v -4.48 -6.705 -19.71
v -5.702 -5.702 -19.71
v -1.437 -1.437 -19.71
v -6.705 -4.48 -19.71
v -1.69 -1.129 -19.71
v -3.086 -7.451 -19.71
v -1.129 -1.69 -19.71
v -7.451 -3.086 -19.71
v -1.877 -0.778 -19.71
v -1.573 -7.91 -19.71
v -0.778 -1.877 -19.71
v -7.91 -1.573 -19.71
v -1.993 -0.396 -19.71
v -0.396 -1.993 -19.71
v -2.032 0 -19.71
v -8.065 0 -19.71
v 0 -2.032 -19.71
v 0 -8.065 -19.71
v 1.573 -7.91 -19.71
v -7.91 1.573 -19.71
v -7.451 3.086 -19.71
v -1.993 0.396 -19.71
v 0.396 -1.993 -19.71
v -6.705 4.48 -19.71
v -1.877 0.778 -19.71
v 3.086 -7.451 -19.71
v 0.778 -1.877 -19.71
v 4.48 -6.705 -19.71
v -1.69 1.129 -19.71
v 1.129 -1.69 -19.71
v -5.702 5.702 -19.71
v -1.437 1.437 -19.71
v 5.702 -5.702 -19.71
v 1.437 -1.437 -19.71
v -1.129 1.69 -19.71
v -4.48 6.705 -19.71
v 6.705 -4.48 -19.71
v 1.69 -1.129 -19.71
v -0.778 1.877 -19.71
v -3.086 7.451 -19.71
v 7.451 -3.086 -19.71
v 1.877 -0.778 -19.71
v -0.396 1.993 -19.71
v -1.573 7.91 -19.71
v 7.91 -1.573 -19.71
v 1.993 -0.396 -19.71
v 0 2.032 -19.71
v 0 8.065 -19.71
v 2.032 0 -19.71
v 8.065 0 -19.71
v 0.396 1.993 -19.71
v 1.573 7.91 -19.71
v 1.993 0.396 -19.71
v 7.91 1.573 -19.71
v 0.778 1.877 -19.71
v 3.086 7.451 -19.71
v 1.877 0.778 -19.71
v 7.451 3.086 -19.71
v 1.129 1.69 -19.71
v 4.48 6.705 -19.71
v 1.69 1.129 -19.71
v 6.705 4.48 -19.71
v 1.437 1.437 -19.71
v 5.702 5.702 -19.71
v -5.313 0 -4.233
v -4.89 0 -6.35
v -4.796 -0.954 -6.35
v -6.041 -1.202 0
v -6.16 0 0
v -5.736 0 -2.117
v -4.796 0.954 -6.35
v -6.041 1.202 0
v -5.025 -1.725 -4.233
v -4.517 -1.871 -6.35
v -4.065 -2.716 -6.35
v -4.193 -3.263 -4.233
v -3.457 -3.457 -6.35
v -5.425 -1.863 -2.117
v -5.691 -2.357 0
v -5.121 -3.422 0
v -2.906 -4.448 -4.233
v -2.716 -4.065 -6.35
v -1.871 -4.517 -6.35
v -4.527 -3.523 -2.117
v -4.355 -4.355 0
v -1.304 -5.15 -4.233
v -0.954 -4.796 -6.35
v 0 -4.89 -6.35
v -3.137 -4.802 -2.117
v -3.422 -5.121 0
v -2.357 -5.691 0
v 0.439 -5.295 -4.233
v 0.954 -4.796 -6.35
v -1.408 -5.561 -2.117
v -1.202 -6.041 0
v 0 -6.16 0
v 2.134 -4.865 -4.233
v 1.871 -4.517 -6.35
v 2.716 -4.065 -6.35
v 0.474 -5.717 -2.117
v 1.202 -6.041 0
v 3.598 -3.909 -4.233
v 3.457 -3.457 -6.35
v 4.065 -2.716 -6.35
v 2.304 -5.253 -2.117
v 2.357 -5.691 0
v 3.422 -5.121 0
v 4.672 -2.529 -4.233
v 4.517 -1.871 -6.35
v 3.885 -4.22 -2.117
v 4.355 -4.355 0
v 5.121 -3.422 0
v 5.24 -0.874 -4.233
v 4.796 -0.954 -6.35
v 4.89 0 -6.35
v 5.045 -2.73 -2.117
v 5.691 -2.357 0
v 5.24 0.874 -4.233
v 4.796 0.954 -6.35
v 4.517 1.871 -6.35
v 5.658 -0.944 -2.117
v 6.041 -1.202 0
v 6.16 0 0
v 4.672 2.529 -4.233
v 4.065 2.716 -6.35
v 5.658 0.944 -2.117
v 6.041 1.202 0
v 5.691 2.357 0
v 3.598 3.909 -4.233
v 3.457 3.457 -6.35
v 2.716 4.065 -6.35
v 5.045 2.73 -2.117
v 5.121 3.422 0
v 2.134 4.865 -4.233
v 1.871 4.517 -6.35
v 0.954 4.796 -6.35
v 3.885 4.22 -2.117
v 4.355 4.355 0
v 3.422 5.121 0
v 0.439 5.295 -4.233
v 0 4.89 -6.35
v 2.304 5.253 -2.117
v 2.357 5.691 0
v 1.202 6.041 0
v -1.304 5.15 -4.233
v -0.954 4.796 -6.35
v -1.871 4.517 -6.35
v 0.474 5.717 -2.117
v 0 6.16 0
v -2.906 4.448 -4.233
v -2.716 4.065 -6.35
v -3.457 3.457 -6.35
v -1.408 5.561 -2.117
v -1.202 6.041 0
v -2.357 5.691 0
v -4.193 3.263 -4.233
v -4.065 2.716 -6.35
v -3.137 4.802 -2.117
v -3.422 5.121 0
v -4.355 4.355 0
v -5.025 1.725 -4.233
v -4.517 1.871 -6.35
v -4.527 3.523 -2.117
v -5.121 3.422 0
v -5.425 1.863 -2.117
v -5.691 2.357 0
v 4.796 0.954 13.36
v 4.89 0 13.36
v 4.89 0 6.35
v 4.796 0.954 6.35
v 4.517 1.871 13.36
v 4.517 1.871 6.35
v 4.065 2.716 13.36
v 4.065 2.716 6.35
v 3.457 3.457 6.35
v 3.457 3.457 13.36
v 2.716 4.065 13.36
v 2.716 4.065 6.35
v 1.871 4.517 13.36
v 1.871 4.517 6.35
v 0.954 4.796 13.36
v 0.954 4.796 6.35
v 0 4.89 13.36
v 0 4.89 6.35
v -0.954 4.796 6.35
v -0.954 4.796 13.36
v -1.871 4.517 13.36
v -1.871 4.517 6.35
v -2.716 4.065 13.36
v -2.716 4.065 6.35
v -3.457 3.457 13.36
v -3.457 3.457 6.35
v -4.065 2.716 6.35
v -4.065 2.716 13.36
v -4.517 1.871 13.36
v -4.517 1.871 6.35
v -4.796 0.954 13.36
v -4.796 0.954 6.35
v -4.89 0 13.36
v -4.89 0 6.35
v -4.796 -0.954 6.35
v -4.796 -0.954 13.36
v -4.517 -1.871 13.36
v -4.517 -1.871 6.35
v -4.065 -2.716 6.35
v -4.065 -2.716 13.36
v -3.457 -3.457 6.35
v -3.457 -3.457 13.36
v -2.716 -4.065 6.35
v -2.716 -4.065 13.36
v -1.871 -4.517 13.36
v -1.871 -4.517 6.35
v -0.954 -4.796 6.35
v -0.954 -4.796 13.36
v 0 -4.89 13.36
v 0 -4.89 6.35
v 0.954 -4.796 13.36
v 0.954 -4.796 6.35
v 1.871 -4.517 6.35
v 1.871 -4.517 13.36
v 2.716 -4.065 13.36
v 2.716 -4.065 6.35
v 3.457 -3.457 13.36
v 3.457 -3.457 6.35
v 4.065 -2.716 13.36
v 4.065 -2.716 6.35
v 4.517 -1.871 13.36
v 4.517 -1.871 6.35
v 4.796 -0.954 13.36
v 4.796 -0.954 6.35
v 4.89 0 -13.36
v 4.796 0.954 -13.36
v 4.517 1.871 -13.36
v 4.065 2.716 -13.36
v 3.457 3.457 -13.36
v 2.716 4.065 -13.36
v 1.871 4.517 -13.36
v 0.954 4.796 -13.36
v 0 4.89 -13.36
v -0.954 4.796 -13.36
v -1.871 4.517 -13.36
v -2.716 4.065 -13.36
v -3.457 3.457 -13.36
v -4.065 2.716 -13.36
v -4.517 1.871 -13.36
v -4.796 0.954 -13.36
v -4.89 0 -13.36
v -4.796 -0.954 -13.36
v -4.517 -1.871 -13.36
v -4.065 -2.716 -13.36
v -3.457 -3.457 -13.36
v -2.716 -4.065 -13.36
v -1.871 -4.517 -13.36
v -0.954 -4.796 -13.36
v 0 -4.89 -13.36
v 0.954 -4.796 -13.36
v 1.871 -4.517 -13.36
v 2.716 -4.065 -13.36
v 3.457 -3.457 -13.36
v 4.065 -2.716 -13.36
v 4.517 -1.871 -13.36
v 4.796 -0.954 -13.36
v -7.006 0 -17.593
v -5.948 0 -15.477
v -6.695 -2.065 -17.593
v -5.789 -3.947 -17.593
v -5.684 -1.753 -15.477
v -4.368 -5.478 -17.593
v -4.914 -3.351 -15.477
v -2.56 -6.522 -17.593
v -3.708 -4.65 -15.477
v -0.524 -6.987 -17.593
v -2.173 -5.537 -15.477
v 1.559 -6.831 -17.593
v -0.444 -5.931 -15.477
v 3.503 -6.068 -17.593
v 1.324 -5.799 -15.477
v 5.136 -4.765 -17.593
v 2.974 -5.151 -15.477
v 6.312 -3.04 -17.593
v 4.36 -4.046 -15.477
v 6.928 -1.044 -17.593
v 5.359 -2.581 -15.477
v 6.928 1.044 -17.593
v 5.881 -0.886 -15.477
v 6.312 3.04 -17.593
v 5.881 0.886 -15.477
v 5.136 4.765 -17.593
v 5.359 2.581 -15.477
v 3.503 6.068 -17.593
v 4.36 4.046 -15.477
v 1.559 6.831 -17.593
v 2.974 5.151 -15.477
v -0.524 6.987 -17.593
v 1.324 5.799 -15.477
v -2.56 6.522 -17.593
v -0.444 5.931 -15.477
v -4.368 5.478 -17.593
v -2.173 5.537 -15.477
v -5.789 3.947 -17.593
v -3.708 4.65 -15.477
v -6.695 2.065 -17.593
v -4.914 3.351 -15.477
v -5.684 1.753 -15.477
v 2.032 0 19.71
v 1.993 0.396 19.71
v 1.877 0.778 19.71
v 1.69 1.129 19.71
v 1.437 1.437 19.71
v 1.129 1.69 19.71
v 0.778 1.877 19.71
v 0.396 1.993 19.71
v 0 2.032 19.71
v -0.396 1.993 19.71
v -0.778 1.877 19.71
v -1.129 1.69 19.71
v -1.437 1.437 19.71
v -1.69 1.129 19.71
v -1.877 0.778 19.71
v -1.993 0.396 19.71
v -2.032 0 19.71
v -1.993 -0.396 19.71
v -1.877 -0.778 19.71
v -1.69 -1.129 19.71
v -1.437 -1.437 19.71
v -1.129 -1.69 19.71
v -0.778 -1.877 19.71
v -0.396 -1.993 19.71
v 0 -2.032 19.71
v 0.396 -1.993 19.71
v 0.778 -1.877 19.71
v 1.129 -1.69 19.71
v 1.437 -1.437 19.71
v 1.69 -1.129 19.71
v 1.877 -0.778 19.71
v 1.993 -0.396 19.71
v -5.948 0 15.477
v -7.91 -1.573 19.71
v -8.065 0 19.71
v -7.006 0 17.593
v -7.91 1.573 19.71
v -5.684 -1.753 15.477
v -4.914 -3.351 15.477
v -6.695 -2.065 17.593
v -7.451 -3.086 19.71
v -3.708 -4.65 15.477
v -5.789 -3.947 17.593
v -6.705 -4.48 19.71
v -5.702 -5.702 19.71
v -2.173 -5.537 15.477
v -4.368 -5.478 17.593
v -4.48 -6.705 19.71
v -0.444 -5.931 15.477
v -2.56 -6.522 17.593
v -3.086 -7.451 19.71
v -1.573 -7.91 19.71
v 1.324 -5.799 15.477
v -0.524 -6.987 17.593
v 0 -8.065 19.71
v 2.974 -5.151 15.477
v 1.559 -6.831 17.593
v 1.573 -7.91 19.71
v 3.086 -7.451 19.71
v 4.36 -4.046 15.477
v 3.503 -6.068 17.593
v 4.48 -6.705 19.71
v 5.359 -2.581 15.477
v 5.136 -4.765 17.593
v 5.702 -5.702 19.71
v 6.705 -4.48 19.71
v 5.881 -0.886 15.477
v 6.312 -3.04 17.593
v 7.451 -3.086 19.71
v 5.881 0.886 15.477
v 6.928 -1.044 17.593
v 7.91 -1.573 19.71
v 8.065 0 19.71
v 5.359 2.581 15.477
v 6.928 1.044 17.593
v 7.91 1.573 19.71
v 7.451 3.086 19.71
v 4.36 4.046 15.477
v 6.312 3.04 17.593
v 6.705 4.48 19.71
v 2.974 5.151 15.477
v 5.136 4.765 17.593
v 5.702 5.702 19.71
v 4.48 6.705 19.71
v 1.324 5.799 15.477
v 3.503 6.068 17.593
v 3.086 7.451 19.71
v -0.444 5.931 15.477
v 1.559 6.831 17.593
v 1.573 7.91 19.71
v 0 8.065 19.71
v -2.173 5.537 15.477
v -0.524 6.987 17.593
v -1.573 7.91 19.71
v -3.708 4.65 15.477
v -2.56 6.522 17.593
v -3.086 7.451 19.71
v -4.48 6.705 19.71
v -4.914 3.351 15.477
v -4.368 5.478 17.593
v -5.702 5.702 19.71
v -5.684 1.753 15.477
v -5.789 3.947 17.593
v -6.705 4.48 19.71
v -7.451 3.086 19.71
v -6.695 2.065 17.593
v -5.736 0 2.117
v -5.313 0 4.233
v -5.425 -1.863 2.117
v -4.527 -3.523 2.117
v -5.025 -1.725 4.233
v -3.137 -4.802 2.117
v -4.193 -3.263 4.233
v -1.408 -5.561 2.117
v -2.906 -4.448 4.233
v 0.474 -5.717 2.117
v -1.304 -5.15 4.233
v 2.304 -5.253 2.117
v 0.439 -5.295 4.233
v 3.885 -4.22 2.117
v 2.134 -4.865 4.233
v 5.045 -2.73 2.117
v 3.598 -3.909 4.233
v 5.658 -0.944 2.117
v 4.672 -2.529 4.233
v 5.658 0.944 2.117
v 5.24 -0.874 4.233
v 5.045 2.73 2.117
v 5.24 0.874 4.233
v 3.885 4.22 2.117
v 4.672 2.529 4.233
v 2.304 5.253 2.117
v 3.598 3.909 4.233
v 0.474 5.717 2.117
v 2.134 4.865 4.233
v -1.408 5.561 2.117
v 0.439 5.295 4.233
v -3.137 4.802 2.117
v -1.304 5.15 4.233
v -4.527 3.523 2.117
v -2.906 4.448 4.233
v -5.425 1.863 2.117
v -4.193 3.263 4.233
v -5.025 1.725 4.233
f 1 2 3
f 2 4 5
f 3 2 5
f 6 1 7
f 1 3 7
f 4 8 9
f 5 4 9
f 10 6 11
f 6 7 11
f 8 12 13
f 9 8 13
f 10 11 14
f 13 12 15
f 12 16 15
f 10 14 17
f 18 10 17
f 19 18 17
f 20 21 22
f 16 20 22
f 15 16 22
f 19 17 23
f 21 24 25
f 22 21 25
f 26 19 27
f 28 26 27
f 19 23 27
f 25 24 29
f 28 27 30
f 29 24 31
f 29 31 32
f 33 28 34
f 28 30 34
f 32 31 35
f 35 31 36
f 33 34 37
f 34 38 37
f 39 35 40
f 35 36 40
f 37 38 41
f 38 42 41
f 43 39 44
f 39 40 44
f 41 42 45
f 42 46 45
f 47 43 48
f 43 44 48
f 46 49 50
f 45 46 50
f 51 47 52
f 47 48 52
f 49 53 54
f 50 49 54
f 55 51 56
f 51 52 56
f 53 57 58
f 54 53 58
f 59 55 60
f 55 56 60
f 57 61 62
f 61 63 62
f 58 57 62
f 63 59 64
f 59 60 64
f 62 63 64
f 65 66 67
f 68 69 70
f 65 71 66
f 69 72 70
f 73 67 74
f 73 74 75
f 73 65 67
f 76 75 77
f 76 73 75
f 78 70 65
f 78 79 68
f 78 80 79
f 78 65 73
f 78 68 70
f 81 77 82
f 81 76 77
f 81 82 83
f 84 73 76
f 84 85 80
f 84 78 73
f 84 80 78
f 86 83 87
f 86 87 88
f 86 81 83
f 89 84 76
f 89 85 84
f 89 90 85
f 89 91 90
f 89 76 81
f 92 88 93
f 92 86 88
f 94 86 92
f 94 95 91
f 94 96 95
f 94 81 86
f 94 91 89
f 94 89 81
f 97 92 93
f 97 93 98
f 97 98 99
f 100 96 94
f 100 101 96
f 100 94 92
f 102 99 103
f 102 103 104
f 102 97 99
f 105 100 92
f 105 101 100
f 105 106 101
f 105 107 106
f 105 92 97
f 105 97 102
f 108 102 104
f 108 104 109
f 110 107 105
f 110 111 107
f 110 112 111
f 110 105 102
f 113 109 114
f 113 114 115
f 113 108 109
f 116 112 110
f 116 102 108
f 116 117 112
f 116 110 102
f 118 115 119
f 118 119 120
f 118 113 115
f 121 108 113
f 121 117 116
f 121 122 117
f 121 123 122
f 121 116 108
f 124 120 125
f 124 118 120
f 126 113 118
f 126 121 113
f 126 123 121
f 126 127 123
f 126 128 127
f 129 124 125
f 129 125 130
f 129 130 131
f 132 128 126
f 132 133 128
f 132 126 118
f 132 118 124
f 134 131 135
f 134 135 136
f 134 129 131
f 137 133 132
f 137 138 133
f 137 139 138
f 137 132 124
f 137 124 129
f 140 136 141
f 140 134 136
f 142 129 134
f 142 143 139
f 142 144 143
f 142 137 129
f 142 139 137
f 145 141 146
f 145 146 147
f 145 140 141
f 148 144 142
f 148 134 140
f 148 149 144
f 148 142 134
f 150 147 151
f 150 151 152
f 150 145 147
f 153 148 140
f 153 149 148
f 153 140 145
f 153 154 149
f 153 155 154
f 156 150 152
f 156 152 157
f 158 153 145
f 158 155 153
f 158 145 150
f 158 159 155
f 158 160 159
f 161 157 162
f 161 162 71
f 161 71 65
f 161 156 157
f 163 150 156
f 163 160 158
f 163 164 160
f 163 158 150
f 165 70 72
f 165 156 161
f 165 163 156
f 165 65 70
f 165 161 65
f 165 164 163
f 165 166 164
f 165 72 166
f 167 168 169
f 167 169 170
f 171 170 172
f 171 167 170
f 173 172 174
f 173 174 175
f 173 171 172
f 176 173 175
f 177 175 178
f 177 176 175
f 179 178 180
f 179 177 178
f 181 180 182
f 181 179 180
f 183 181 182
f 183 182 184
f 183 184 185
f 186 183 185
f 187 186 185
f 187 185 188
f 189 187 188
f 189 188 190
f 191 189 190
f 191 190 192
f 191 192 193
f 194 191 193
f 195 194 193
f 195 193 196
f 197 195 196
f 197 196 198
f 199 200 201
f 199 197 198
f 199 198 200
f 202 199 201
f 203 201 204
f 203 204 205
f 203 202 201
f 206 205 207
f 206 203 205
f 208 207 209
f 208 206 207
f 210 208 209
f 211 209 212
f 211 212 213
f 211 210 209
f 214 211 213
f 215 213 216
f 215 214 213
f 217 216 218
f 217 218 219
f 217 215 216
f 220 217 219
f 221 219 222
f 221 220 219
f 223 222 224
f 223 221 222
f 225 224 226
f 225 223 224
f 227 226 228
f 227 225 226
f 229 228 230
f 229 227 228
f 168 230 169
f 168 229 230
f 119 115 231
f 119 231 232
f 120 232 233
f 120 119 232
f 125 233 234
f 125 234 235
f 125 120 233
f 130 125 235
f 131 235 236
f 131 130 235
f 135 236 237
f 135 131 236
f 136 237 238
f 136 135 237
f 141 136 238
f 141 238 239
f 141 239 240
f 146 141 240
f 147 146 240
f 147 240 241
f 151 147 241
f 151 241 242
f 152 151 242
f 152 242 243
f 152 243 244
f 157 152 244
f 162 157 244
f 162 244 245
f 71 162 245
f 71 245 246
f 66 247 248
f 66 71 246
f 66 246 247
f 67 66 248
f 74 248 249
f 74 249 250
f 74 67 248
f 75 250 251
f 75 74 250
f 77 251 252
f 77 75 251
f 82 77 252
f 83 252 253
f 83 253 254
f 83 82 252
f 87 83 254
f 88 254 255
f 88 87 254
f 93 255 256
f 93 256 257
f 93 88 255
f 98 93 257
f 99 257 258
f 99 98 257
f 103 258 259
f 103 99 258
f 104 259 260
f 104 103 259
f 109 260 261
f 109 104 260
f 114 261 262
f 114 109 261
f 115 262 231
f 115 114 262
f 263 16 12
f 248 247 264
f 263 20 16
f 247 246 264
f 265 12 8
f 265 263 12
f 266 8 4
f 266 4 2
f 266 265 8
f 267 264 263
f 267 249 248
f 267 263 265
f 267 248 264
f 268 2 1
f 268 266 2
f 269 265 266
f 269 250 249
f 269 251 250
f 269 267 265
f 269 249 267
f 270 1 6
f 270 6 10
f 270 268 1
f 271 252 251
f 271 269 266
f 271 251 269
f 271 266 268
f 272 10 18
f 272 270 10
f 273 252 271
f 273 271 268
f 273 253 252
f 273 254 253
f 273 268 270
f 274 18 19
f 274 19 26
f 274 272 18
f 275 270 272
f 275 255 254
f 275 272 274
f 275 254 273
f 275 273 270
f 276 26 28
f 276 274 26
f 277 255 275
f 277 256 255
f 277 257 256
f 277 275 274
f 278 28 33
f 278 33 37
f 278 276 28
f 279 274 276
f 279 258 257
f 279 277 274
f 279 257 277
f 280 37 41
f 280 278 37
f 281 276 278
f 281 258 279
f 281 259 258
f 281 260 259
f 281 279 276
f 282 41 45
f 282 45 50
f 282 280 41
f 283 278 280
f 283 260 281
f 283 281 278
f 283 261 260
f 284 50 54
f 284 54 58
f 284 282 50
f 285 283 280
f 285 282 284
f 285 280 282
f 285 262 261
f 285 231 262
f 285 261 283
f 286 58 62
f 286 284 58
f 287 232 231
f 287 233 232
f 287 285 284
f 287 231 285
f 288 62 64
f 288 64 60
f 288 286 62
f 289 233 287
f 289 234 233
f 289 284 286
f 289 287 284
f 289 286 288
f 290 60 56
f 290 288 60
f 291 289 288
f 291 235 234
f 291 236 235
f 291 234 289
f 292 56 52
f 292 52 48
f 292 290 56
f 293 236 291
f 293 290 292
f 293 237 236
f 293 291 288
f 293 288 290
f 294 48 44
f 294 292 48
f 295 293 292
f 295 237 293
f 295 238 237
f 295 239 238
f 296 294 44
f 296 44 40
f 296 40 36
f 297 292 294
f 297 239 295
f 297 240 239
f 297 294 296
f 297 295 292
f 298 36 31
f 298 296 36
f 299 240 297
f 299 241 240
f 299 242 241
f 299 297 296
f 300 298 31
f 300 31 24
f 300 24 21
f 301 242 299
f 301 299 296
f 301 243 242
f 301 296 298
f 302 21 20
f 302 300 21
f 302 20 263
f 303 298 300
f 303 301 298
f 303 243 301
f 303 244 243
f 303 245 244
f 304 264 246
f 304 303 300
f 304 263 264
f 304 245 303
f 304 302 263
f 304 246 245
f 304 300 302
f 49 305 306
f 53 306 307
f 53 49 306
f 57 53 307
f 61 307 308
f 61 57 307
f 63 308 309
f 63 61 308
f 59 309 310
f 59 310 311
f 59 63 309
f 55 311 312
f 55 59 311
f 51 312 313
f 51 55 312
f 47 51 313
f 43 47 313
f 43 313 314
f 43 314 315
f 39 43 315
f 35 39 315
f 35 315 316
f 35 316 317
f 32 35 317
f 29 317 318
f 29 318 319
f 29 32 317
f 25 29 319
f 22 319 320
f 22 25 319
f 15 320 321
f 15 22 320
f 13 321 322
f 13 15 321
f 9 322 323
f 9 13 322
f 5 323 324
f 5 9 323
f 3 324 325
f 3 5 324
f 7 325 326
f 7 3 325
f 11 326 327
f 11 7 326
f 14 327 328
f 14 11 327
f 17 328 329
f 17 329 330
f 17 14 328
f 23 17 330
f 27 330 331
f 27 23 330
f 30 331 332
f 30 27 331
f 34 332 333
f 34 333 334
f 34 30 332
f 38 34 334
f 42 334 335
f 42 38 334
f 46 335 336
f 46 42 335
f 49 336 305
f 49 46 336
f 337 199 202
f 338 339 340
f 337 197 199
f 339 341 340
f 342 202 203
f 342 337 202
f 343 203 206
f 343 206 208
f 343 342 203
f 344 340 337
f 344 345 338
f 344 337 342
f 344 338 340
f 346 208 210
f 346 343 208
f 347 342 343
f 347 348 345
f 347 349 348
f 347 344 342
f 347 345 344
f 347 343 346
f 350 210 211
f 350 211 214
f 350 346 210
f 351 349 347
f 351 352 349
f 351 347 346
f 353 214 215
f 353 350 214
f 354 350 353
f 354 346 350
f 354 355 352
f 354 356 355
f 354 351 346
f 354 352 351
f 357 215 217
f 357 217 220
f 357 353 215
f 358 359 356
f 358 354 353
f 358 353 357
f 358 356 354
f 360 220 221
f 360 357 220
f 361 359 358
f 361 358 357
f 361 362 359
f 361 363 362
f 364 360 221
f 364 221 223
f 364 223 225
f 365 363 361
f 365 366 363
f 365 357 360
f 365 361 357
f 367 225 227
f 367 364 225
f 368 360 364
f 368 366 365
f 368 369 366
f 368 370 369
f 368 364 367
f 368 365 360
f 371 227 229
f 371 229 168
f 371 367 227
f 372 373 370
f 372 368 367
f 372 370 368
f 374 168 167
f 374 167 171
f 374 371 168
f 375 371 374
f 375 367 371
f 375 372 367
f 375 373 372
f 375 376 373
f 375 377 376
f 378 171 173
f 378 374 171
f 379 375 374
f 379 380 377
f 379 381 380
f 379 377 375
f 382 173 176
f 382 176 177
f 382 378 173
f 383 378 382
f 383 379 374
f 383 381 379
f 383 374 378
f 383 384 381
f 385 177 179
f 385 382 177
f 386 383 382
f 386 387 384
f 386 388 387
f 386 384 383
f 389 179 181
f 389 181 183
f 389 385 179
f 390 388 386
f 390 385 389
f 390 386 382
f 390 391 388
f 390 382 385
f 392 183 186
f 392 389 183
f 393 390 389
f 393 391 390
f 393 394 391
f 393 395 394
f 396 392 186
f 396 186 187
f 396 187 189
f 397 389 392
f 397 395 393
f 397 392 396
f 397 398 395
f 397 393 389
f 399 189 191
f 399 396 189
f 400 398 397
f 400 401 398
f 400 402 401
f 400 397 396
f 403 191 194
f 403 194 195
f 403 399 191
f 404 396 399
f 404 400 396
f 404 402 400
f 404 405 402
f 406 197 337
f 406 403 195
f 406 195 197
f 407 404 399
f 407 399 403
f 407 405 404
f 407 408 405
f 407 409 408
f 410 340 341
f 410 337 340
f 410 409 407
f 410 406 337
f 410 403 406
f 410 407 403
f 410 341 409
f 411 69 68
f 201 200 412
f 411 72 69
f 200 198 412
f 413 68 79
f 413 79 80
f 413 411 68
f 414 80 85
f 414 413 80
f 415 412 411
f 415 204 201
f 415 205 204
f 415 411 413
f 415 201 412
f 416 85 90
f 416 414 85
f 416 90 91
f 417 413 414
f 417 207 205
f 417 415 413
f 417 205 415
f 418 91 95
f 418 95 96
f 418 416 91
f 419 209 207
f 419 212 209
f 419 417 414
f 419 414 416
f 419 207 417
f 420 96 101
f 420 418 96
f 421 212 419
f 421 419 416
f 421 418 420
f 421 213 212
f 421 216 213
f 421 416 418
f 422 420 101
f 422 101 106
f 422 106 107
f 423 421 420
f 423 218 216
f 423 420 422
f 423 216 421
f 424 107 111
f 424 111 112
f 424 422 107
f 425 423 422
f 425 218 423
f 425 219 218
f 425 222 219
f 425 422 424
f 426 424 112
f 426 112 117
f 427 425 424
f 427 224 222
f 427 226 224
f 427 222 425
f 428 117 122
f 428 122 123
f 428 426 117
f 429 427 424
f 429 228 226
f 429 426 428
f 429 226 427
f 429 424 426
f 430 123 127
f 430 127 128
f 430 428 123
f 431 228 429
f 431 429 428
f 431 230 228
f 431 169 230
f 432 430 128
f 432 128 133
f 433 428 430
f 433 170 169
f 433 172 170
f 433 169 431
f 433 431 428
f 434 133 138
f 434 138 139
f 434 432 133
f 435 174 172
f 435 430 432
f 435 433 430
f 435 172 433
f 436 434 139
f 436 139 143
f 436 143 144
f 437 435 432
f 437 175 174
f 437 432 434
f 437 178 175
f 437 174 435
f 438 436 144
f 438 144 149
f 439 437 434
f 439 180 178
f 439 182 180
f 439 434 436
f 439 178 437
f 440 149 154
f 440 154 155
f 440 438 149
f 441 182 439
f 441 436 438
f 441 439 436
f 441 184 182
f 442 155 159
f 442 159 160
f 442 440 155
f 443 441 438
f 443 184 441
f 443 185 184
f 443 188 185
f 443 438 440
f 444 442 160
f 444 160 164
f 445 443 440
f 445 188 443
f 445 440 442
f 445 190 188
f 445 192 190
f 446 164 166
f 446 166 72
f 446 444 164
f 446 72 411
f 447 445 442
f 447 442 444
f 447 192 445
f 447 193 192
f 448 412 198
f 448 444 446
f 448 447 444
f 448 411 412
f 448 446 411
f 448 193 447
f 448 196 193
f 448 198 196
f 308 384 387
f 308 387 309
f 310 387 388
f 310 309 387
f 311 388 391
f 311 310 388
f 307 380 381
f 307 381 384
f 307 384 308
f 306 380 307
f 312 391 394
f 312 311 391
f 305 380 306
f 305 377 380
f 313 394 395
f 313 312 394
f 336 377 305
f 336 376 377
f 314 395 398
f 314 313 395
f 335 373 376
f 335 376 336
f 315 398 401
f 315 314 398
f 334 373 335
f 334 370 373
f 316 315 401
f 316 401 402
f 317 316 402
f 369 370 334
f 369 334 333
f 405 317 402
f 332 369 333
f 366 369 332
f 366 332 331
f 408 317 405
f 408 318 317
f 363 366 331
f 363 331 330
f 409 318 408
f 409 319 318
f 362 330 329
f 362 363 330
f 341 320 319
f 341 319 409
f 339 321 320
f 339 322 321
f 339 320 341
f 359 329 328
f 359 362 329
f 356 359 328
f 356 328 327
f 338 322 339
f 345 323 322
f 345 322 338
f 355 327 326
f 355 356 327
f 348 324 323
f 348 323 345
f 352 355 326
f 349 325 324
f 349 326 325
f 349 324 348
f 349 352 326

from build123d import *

# Parameters (mm, degrees)
ESQUISSE1_R        = 4.8895
ESQUISSE1_R_2      = 2.032
BOSS_EXTRU_1_DEPTH = 19.71


with BuildPart() as part:
    # Esquisse1 → Boss.-Extru.1 (new, symmetric)
    with BuildSketch(Plane.XY):
        Circle(ESQUISSE1_R)
        Circle(ESQUISSE1_R_2, mode=Mode.SUBTRACT)
    extrude(amount=BOSS_EXTRU_1_DEPTH, both=True)

    # Esquisse2 → Révolution1 (revolve)
    with BuildSketch(Plane(origin=(0, 0, 0), x_dir=(0, 0, -1), z_dir=(1, 0, 0)), mode=Mode.PRIVATE) as r_volution1_sk:
        Polygon((-13.36, 4.8895), (-19.71, 8.0645), (-19.71, 4.8895), align=None)
        Polygon((0, 6.1595), (-6.35, 4.8895), (0, 4.8895), (6.35, 4.8895), align=None)
        Polygon((19.71, 4.8895), (19.71, 8.0645), (13.36, 4.8895), align=None)
    revolve(r_volution1_sk.sketch.rotate(Axis((0, 0, 0), (0, 0, 1)), 90), axis=Axis((0, 0, 0), (0, 0, 1)))


solid = part.part
